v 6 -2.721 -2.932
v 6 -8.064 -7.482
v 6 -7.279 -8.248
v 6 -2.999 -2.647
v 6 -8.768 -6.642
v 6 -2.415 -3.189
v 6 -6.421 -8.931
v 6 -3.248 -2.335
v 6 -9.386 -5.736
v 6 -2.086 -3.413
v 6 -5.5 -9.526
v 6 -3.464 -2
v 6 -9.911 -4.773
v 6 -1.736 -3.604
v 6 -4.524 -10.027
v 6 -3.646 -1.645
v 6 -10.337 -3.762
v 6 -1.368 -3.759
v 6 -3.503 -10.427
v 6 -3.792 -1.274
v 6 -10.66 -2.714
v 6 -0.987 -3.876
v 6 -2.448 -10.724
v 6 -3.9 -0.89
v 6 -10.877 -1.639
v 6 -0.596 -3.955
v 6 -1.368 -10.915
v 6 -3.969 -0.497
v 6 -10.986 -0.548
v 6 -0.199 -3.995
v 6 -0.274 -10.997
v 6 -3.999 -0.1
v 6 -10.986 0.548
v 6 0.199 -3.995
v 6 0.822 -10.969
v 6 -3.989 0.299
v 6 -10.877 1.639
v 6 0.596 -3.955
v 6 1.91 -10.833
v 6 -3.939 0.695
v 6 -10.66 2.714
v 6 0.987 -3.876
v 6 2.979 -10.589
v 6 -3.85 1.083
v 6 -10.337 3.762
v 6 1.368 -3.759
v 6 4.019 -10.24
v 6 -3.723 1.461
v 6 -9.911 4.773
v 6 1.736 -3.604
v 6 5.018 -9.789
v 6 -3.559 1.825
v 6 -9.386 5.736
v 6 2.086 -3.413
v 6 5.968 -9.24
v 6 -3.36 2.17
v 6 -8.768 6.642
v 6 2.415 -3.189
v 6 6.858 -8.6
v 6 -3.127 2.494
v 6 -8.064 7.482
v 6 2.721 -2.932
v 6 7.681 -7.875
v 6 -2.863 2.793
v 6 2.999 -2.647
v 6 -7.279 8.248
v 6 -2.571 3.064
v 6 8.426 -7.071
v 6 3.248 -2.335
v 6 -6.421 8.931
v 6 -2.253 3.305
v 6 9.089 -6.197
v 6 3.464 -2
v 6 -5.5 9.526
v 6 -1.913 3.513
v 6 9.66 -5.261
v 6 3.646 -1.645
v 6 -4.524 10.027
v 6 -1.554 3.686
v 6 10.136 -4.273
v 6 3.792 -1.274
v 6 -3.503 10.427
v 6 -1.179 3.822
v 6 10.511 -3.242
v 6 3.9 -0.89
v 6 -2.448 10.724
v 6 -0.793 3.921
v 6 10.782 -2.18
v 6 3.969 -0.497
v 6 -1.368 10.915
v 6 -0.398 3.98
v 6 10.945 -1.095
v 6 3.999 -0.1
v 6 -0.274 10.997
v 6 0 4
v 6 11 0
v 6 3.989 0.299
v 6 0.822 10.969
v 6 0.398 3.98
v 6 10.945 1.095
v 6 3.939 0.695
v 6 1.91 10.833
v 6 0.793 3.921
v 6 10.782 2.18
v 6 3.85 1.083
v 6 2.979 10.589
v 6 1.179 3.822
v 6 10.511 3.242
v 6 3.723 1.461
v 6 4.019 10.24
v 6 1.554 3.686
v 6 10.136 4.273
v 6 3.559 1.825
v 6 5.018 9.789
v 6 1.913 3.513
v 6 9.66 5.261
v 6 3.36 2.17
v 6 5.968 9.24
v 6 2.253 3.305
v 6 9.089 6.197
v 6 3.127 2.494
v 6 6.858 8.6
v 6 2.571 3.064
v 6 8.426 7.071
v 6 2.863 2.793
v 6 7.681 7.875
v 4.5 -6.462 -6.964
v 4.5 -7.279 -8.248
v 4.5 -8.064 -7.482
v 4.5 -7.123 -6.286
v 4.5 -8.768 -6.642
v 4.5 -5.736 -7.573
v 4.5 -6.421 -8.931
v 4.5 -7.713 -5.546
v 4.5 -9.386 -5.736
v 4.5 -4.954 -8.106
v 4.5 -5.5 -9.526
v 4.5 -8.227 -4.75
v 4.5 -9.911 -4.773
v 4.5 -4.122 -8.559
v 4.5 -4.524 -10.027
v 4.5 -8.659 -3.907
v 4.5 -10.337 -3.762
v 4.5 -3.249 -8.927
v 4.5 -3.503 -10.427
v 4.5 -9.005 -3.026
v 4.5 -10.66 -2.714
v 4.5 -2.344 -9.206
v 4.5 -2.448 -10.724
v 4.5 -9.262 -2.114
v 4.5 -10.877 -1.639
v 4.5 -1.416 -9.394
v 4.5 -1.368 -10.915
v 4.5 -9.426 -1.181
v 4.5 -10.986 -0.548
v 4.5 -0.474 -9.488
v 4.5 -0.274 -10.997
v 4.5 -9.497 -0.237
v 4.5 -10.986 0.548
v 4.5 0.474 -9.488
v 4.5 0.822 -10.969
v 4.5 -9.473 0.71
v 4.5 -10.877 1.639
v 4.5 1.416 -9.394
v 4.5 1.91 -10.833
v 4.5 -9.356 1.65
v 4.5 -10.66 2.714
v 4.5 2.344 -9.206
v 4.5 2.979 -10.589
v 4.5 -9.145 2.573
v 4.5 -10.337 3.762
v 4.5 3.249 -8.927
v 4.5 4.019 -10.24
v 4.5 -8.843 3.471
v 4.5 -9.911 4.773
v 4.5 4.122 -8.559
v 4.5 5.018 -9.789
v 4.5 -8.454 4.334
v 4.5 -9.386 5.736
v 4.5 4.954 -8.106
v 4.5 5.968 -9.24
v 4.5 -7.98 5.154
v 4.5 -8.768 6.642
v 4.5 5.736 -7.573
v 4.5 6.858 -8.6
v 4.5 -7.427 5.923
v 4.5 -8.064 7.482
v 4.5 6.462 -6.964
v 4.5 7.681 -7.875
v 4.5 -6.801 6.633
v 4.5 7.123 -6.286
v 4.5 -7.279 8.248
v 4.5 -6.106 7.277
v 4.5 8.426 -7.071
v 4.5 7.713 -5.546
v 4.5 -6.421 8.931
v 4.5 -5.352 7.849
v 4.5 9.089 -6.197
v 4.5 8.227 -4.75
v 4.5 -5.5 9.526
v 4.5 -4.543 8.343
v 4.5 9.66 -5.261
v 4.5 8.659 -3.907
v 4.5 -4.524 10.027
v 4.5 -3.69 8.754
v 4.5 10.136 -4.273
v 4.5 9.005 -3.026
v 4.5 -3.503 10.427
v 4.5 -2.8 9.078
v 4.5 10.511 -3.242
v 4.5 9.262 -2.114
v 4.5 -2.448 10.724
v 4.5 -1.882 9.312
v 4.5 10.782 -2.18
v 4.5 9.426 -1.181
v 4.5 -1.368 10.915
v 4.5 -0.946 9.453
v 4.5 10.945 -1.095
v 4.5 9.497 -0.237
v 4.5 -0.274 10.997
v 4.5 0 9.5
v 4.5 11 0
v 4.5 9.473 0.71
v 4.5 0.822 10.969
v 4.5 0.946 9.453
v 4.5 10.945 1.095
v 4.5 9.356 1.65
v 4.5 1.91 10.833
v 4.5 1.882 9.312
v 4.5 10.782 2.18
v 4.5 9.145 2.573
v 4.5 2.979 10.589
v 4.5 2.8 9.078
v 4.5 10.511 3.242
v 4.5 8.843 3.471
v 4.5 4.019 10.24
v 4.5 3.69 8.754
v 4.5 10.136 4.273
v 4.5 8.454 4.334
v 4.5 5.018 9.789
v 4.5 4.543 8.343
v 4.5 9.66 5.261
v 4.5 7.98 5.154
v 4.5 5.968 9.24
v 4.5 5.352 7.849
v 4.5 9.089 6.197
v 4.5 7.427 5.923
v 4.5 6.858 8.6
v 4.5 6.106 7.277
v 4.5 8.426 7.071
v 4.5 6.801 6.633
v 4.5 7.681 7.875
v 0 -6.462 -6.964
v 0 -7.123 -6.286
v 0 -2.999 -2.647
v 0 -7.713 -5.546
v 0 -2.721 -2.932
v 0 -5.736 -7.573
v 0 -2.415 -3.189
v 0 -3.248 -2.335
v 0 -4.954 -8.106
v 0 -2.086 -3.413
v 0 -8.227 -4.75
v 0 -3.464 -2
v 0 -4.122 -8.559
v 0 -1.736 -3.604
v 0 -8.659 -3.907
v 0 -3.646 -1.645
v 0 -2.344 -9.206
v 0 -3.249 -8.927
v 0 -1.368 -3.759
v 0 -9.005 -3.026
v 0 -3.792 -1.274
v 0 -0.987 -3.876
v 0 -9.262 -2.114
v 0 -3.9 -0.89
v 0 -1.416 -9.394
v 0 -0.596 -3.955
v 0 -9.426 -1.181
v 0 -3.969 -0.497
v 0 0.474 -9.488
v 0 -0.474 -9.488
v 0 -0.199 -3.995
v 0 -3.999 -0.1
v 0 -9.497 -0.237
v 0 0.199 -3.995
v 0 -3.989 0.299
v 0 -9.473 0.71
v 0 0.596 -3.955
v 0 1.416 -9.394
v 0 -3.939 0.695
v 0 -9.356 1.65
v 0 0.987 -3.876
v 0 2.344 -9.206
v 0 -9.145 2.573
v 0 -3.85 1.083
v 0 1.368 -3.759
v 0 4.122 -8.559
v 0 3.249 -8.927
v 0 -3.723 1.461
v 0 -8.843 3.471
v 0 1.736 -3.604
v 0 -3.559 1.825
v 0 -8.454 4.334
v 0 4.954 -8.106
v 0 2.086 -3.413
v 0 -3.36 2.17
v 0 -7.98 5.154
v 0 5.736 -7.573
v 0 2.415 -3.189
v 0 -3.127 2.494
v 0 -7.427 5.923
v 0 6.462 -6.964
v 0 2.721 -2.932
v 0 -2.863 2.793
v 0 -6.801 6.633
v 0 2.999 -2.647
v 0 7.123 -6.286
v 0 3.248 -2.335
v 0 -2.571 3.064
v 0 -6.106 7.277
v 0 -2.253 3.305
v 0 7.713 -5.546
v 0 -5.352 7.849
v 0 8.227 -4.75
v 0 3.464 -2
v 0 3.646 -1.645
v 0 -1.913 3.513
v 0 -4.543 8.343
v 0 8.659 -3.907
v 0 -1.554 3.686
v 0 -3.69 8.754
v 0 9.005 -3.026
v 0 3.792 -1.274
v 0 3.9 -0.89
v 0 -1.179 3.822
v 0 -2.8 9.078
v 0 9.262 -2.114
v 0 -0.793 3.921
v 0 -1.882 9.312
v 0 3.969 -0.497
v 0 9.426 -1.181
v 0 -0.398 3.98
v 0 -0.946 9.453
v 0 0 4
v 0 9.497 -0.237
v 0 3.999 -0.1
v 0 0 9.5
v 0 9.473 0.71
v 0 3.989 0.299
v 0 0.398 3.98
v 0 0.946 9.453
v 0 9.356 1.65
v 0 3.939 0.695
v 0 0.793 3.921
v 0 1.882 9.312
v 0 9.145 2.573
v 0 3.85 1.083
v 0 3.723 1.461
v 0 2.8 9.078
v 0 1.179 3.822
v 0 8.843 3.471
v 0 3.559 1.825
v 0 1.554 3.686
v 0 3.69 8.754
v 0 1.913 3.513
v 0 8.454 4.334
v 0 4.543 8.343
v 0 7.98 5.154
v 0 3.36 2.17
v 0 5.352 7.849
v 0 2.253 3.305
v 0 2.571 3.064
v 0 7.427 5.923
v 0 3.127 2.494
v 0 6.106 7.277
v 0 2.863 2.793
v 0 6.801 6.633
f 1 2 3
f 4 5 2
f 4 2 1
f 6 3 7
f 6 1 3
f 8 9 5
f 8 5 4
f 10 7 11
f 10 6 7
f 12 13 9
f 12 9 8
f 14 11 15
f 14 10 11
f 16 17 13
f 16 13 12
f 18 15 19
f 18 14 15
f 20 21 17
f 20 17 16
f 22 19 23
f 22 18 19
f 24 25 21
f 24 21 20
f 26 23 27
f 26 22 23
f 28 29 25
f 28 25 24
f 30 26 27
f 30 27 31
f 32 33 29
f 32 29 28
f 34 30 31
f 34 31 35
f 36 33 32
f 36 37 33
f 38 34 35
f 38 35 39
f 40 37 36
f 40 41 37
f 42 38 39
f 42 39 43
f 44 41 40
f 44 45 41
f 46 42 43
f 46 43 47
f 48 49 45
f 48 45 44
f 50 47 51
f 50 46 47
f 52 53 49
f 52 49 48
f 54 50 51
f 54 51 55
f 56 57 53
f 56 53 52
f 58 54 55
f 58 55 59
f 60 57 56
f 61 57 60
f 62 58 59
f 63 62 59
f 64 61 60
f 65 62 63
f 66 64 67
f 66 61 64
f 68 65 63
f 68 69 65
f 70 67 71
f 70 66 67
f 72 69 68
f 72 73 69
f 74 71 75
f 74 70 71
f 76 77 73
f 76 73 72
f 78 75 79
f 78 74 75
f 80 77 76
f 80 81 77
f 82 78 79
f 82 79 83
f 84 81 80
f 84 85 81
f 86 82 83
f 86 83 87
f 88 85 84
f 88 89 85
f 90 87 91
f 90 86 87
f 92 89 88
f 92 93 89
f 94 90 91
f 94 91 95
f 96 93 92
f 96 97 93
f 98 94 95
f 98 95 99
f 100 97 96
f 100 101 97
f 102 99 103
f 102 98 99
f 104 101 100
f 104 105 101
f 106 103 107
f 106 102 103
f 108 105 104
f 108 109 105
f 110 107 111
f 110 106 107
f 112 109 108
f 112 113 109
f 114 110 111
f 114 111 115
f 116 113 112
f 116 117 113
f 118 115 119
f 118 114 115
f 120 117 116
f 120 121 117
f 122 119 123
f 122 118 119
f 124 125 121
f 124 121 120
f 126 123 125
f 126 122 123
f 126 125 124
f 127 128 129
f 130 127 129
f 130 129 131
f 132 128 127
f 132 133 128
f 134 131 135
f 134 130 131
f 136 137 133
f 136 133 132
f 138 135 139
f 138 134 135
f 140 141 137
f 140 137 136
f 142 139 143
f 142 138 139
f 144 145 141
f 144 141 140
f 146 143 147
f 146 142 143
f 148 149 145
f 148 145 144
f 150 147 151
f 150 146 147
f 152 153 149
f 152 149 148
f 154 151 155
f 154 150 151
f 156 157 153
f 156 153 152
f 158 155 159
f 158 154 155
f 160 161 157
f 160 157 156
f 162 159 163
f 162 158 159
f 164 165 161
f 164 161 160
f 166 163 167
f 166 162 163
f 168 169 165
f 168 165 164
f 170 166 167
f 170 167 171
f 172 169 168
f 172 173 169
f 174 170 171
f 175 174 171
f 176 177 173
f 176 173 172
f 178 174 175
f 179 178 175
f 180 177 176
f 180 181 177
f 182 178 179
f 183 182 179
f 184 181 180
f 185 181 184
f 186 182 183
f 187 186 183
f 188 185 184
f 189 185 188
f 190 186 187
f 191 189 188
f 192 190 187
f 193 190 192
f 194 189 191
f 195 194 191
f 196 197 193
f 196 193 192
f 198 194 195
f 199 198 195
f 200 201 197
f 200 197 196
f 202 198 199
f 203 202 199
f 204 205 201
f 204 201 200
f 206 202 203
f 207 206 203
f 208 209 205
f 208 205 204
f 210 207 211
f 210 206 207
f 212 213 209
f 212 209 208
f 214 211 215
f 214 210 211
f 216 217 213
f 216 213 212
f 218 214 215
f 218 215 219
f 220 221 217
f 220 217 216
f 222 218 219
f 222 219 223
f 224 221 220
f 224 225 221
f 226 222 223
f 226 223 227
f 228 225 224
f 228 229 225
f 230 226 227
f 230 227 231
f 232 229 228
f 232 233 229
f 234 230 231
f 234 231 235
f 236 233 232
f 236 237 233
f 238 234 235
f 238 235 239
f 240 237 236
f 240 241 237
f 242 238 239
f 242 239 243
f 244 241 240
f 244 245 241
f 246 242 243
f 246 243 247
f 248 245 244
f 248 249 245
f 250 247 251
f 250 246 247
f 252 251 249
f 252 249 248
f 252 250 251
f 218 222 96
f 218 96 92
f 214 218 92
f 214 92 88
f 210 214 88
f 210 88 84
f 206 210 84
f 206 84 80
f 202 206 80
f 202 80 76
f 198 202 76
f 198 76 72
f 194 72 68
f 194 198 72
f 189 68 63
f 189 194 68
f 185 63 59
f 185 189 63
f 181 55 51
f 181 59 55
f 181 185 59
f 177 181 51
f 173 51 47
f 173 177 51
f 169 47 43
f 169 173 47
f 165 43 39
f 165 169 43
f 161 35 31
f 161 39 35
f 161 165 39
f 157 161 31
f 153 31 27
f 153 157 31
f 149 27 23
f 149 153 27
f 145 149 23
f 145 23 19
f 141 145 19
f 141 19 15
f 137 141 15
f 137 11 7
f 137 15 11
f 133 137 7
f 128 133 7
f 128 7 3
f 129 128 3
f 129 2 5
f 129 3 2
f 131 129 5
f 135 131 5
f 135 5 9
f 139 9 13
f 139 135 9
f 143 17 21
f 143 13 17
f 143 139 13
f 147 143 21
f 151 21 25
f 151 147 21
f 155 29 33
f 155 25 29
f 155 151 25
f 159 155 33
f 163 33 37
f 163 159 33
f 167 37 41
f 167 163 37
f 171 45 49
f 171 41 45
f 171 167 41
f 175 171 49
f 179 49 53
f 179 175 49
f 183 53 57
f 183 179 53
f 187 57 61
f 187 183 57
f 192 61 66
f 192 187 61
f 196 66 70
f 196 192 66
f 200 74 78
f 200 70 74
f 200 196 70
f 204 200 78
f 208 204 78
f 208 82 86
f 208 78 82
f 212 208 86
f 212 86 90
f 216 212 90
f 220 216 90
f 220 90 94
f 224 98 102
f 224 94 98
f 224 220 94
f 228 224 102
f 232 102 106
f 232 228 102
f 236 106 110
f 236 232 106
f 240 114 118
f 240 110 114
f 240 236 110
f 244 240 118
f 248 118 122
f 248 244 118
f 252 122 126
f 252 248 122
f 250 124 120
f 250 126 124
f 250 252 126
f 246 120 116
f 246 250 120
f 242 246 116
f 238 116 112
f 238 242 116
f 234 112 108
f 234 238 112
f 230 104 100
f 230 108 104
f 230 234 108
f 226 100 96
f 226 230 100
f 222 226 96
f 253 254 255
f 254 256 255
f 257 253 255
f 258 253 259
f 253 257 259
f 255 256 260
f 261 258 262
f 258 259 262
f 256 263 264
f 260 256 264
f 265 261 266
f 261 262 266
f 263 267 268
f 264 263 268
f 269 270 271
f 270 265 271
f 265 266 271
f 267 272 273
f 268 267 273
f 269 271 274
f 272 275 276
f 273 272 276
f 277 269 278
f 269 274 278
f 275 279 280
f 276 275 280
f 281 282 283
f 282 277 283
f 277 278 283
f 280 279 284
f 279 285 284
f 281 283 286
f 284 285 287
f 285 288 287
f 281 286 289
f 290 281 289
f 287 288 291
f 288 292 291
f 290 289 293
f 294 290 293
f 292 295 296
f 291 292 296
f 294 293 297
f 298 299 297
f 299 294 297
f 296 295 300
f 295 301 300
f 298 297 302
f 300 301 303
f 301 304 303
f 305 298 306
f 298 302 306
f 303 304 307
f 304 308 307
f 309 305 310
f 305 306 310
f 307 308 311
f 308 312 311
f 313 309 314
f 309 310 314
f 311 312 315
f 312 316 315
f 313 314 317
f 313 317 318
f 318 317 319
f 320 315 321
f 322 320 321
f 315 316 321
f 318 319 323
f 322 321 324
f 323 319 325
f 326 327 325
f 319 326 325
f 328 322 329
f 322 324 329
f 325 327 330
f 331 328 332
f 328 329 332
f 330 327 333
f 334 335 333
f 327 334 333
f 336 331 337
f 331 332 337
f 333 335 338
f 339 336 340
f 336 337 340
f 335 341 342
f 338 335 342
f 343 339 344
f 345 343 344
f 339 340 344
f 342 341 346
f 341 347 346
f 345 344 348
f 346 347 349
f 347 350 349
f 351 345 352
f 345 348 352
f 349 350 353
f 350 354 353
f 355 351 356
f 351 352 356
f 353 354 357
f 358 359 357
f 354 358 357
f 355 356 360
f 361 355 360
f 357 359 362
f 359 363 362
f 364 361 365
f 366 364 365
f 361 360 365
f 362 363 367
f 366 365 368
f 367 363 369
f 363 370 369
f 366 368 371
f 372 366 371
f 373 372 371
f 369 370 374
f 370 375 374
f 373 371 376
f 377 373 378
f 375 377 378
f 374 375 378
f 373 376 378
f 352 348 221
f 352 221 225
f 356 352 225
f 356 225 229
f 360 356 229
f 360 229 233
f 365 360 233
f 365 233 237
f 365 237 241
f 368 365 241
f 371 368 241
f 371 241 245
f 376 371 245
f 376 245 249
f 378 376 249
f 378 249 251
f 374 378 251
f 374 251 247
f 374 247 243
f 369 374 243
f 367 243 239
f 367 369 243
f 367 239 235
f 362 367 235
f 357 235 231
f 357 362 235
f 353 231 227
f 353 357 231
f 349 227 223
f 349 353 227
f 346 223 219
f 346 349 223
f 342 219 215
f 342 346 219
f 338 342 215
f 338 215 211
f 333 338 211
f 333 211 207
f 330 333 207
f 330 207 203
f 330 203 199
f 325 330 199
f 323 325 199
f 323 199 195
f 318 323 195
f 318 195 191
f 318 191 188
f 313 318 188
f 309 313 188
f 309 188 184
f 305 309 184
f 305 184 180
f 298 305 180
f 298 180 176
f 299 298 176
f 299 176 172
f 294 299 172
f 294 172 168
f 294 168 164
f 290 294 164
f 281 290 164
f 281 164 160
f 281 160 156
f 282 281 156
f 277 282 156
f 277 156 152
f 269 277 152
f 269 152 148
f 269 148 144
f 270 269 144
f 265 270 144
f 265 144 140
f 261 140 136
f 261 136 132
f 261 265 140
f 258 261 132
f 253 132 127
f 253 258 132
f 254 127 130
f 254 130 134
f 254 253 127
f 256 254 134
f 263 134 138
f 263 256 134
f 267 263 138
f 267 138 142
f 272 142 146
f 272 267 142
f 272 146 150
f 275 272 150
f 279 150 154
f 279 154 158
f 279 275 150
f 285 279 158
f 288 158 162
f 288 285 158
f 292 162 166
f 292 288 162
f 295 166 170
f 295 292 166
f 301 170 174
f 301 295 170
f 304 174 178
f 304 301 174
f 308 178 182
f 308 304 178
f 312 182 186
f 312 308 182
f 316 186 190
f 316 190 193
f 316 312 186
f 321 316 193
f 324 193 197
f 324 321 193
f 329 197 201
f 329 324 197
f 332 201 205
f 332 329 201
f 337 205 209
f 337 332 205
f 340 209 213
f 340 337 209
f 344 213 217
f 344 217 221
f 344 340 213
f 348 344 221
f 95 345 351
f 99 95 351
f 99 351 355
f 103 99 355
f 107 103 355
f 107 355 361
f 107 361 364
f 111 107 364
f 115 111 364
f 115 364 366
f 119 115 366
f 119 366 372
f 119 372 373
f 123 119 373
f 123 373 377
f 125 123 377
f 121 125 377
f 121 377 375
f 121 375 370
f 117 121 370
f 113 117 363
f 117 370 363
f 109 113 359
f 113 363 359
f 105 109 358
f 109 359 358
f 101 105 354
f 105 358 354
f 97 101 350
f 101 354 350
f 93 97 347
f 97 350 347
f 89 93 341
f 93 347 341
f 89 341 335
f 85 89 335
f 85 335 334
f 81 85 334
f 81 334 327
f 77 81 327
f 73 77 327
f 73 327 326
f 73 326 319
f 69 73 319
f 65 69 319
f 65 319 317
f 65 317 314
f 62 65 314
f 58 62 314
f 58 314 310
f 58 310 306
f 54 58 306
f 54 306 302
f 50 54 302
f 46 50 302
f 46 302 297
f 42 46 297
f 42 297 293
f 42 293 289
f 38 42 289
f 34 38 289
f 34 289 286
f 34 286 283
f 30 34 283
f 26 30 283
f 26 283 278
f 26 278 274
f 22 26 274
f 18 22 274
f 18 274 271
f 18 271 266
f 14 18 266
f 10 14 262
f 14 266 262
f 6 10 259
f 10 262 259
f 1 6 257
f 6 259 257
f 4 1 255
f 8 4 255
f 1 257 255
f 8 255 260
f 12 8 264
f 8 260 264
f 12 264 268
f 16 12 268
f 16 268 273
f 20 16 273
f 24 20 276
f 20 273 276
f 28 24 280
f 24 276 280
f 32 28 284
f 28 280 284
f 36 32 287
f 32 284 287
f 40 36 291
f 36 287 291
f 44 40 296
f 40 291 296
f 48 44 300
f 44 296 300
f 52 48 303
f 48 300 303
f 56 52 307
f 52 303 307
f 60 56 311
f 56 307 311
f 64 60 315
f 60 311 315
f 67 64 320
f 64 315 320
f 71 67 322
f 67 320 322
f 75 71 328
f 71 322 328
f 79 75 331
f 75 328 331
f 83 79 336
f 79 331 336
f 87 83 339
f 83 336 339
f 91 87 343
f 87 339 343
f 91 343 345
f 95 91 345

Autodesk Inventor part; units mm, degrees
ref_plane "YZ Plane" through (0, 0, 0) normal (1, 0, 0) x (0, 1, 0)
ref_plane "XZ Plane" through (0, 0, 0) normal (0, 1, 0) x (-1, 0, 0)
ref_plane "XY Plane" through (0, 0, 0) normal (0, 0, 1) x (1, 0, 0)
sketch "スケッチ1" plane through (0, 0, 0) normal (1, 0, 0) x (0, 1, 0)
  circle A0 centre (0, 0) radius 11
  dimension "d0" = 22
extrude "押し出し1" add sketch "スケッチ1" along normal blind 6
sketch "スケッチ2" plane through (0, 0, 0) normal (-1, 0, 0) x (0, 0, 1)
  circle A0 centre (0, 0) radius 9.5
  circle A1 centre (0, 0) radius 11
  dimension "d3" = 19
  dimension "d4" = 22
extrude "押し出し2" cut sketch "スケッチ2" against normal blind 4.5
sketch "スケッチ3" plane through (0, 0, 0) normal (-1, 0, 0) x (0, 0, 1)
  circle A0 centre (0, 0) radius 4
  dimension "d7" = 8
extrude "押し出し3" cut sketch "スケッチ3" against normal through all
properties part number "8mmベアリング"
